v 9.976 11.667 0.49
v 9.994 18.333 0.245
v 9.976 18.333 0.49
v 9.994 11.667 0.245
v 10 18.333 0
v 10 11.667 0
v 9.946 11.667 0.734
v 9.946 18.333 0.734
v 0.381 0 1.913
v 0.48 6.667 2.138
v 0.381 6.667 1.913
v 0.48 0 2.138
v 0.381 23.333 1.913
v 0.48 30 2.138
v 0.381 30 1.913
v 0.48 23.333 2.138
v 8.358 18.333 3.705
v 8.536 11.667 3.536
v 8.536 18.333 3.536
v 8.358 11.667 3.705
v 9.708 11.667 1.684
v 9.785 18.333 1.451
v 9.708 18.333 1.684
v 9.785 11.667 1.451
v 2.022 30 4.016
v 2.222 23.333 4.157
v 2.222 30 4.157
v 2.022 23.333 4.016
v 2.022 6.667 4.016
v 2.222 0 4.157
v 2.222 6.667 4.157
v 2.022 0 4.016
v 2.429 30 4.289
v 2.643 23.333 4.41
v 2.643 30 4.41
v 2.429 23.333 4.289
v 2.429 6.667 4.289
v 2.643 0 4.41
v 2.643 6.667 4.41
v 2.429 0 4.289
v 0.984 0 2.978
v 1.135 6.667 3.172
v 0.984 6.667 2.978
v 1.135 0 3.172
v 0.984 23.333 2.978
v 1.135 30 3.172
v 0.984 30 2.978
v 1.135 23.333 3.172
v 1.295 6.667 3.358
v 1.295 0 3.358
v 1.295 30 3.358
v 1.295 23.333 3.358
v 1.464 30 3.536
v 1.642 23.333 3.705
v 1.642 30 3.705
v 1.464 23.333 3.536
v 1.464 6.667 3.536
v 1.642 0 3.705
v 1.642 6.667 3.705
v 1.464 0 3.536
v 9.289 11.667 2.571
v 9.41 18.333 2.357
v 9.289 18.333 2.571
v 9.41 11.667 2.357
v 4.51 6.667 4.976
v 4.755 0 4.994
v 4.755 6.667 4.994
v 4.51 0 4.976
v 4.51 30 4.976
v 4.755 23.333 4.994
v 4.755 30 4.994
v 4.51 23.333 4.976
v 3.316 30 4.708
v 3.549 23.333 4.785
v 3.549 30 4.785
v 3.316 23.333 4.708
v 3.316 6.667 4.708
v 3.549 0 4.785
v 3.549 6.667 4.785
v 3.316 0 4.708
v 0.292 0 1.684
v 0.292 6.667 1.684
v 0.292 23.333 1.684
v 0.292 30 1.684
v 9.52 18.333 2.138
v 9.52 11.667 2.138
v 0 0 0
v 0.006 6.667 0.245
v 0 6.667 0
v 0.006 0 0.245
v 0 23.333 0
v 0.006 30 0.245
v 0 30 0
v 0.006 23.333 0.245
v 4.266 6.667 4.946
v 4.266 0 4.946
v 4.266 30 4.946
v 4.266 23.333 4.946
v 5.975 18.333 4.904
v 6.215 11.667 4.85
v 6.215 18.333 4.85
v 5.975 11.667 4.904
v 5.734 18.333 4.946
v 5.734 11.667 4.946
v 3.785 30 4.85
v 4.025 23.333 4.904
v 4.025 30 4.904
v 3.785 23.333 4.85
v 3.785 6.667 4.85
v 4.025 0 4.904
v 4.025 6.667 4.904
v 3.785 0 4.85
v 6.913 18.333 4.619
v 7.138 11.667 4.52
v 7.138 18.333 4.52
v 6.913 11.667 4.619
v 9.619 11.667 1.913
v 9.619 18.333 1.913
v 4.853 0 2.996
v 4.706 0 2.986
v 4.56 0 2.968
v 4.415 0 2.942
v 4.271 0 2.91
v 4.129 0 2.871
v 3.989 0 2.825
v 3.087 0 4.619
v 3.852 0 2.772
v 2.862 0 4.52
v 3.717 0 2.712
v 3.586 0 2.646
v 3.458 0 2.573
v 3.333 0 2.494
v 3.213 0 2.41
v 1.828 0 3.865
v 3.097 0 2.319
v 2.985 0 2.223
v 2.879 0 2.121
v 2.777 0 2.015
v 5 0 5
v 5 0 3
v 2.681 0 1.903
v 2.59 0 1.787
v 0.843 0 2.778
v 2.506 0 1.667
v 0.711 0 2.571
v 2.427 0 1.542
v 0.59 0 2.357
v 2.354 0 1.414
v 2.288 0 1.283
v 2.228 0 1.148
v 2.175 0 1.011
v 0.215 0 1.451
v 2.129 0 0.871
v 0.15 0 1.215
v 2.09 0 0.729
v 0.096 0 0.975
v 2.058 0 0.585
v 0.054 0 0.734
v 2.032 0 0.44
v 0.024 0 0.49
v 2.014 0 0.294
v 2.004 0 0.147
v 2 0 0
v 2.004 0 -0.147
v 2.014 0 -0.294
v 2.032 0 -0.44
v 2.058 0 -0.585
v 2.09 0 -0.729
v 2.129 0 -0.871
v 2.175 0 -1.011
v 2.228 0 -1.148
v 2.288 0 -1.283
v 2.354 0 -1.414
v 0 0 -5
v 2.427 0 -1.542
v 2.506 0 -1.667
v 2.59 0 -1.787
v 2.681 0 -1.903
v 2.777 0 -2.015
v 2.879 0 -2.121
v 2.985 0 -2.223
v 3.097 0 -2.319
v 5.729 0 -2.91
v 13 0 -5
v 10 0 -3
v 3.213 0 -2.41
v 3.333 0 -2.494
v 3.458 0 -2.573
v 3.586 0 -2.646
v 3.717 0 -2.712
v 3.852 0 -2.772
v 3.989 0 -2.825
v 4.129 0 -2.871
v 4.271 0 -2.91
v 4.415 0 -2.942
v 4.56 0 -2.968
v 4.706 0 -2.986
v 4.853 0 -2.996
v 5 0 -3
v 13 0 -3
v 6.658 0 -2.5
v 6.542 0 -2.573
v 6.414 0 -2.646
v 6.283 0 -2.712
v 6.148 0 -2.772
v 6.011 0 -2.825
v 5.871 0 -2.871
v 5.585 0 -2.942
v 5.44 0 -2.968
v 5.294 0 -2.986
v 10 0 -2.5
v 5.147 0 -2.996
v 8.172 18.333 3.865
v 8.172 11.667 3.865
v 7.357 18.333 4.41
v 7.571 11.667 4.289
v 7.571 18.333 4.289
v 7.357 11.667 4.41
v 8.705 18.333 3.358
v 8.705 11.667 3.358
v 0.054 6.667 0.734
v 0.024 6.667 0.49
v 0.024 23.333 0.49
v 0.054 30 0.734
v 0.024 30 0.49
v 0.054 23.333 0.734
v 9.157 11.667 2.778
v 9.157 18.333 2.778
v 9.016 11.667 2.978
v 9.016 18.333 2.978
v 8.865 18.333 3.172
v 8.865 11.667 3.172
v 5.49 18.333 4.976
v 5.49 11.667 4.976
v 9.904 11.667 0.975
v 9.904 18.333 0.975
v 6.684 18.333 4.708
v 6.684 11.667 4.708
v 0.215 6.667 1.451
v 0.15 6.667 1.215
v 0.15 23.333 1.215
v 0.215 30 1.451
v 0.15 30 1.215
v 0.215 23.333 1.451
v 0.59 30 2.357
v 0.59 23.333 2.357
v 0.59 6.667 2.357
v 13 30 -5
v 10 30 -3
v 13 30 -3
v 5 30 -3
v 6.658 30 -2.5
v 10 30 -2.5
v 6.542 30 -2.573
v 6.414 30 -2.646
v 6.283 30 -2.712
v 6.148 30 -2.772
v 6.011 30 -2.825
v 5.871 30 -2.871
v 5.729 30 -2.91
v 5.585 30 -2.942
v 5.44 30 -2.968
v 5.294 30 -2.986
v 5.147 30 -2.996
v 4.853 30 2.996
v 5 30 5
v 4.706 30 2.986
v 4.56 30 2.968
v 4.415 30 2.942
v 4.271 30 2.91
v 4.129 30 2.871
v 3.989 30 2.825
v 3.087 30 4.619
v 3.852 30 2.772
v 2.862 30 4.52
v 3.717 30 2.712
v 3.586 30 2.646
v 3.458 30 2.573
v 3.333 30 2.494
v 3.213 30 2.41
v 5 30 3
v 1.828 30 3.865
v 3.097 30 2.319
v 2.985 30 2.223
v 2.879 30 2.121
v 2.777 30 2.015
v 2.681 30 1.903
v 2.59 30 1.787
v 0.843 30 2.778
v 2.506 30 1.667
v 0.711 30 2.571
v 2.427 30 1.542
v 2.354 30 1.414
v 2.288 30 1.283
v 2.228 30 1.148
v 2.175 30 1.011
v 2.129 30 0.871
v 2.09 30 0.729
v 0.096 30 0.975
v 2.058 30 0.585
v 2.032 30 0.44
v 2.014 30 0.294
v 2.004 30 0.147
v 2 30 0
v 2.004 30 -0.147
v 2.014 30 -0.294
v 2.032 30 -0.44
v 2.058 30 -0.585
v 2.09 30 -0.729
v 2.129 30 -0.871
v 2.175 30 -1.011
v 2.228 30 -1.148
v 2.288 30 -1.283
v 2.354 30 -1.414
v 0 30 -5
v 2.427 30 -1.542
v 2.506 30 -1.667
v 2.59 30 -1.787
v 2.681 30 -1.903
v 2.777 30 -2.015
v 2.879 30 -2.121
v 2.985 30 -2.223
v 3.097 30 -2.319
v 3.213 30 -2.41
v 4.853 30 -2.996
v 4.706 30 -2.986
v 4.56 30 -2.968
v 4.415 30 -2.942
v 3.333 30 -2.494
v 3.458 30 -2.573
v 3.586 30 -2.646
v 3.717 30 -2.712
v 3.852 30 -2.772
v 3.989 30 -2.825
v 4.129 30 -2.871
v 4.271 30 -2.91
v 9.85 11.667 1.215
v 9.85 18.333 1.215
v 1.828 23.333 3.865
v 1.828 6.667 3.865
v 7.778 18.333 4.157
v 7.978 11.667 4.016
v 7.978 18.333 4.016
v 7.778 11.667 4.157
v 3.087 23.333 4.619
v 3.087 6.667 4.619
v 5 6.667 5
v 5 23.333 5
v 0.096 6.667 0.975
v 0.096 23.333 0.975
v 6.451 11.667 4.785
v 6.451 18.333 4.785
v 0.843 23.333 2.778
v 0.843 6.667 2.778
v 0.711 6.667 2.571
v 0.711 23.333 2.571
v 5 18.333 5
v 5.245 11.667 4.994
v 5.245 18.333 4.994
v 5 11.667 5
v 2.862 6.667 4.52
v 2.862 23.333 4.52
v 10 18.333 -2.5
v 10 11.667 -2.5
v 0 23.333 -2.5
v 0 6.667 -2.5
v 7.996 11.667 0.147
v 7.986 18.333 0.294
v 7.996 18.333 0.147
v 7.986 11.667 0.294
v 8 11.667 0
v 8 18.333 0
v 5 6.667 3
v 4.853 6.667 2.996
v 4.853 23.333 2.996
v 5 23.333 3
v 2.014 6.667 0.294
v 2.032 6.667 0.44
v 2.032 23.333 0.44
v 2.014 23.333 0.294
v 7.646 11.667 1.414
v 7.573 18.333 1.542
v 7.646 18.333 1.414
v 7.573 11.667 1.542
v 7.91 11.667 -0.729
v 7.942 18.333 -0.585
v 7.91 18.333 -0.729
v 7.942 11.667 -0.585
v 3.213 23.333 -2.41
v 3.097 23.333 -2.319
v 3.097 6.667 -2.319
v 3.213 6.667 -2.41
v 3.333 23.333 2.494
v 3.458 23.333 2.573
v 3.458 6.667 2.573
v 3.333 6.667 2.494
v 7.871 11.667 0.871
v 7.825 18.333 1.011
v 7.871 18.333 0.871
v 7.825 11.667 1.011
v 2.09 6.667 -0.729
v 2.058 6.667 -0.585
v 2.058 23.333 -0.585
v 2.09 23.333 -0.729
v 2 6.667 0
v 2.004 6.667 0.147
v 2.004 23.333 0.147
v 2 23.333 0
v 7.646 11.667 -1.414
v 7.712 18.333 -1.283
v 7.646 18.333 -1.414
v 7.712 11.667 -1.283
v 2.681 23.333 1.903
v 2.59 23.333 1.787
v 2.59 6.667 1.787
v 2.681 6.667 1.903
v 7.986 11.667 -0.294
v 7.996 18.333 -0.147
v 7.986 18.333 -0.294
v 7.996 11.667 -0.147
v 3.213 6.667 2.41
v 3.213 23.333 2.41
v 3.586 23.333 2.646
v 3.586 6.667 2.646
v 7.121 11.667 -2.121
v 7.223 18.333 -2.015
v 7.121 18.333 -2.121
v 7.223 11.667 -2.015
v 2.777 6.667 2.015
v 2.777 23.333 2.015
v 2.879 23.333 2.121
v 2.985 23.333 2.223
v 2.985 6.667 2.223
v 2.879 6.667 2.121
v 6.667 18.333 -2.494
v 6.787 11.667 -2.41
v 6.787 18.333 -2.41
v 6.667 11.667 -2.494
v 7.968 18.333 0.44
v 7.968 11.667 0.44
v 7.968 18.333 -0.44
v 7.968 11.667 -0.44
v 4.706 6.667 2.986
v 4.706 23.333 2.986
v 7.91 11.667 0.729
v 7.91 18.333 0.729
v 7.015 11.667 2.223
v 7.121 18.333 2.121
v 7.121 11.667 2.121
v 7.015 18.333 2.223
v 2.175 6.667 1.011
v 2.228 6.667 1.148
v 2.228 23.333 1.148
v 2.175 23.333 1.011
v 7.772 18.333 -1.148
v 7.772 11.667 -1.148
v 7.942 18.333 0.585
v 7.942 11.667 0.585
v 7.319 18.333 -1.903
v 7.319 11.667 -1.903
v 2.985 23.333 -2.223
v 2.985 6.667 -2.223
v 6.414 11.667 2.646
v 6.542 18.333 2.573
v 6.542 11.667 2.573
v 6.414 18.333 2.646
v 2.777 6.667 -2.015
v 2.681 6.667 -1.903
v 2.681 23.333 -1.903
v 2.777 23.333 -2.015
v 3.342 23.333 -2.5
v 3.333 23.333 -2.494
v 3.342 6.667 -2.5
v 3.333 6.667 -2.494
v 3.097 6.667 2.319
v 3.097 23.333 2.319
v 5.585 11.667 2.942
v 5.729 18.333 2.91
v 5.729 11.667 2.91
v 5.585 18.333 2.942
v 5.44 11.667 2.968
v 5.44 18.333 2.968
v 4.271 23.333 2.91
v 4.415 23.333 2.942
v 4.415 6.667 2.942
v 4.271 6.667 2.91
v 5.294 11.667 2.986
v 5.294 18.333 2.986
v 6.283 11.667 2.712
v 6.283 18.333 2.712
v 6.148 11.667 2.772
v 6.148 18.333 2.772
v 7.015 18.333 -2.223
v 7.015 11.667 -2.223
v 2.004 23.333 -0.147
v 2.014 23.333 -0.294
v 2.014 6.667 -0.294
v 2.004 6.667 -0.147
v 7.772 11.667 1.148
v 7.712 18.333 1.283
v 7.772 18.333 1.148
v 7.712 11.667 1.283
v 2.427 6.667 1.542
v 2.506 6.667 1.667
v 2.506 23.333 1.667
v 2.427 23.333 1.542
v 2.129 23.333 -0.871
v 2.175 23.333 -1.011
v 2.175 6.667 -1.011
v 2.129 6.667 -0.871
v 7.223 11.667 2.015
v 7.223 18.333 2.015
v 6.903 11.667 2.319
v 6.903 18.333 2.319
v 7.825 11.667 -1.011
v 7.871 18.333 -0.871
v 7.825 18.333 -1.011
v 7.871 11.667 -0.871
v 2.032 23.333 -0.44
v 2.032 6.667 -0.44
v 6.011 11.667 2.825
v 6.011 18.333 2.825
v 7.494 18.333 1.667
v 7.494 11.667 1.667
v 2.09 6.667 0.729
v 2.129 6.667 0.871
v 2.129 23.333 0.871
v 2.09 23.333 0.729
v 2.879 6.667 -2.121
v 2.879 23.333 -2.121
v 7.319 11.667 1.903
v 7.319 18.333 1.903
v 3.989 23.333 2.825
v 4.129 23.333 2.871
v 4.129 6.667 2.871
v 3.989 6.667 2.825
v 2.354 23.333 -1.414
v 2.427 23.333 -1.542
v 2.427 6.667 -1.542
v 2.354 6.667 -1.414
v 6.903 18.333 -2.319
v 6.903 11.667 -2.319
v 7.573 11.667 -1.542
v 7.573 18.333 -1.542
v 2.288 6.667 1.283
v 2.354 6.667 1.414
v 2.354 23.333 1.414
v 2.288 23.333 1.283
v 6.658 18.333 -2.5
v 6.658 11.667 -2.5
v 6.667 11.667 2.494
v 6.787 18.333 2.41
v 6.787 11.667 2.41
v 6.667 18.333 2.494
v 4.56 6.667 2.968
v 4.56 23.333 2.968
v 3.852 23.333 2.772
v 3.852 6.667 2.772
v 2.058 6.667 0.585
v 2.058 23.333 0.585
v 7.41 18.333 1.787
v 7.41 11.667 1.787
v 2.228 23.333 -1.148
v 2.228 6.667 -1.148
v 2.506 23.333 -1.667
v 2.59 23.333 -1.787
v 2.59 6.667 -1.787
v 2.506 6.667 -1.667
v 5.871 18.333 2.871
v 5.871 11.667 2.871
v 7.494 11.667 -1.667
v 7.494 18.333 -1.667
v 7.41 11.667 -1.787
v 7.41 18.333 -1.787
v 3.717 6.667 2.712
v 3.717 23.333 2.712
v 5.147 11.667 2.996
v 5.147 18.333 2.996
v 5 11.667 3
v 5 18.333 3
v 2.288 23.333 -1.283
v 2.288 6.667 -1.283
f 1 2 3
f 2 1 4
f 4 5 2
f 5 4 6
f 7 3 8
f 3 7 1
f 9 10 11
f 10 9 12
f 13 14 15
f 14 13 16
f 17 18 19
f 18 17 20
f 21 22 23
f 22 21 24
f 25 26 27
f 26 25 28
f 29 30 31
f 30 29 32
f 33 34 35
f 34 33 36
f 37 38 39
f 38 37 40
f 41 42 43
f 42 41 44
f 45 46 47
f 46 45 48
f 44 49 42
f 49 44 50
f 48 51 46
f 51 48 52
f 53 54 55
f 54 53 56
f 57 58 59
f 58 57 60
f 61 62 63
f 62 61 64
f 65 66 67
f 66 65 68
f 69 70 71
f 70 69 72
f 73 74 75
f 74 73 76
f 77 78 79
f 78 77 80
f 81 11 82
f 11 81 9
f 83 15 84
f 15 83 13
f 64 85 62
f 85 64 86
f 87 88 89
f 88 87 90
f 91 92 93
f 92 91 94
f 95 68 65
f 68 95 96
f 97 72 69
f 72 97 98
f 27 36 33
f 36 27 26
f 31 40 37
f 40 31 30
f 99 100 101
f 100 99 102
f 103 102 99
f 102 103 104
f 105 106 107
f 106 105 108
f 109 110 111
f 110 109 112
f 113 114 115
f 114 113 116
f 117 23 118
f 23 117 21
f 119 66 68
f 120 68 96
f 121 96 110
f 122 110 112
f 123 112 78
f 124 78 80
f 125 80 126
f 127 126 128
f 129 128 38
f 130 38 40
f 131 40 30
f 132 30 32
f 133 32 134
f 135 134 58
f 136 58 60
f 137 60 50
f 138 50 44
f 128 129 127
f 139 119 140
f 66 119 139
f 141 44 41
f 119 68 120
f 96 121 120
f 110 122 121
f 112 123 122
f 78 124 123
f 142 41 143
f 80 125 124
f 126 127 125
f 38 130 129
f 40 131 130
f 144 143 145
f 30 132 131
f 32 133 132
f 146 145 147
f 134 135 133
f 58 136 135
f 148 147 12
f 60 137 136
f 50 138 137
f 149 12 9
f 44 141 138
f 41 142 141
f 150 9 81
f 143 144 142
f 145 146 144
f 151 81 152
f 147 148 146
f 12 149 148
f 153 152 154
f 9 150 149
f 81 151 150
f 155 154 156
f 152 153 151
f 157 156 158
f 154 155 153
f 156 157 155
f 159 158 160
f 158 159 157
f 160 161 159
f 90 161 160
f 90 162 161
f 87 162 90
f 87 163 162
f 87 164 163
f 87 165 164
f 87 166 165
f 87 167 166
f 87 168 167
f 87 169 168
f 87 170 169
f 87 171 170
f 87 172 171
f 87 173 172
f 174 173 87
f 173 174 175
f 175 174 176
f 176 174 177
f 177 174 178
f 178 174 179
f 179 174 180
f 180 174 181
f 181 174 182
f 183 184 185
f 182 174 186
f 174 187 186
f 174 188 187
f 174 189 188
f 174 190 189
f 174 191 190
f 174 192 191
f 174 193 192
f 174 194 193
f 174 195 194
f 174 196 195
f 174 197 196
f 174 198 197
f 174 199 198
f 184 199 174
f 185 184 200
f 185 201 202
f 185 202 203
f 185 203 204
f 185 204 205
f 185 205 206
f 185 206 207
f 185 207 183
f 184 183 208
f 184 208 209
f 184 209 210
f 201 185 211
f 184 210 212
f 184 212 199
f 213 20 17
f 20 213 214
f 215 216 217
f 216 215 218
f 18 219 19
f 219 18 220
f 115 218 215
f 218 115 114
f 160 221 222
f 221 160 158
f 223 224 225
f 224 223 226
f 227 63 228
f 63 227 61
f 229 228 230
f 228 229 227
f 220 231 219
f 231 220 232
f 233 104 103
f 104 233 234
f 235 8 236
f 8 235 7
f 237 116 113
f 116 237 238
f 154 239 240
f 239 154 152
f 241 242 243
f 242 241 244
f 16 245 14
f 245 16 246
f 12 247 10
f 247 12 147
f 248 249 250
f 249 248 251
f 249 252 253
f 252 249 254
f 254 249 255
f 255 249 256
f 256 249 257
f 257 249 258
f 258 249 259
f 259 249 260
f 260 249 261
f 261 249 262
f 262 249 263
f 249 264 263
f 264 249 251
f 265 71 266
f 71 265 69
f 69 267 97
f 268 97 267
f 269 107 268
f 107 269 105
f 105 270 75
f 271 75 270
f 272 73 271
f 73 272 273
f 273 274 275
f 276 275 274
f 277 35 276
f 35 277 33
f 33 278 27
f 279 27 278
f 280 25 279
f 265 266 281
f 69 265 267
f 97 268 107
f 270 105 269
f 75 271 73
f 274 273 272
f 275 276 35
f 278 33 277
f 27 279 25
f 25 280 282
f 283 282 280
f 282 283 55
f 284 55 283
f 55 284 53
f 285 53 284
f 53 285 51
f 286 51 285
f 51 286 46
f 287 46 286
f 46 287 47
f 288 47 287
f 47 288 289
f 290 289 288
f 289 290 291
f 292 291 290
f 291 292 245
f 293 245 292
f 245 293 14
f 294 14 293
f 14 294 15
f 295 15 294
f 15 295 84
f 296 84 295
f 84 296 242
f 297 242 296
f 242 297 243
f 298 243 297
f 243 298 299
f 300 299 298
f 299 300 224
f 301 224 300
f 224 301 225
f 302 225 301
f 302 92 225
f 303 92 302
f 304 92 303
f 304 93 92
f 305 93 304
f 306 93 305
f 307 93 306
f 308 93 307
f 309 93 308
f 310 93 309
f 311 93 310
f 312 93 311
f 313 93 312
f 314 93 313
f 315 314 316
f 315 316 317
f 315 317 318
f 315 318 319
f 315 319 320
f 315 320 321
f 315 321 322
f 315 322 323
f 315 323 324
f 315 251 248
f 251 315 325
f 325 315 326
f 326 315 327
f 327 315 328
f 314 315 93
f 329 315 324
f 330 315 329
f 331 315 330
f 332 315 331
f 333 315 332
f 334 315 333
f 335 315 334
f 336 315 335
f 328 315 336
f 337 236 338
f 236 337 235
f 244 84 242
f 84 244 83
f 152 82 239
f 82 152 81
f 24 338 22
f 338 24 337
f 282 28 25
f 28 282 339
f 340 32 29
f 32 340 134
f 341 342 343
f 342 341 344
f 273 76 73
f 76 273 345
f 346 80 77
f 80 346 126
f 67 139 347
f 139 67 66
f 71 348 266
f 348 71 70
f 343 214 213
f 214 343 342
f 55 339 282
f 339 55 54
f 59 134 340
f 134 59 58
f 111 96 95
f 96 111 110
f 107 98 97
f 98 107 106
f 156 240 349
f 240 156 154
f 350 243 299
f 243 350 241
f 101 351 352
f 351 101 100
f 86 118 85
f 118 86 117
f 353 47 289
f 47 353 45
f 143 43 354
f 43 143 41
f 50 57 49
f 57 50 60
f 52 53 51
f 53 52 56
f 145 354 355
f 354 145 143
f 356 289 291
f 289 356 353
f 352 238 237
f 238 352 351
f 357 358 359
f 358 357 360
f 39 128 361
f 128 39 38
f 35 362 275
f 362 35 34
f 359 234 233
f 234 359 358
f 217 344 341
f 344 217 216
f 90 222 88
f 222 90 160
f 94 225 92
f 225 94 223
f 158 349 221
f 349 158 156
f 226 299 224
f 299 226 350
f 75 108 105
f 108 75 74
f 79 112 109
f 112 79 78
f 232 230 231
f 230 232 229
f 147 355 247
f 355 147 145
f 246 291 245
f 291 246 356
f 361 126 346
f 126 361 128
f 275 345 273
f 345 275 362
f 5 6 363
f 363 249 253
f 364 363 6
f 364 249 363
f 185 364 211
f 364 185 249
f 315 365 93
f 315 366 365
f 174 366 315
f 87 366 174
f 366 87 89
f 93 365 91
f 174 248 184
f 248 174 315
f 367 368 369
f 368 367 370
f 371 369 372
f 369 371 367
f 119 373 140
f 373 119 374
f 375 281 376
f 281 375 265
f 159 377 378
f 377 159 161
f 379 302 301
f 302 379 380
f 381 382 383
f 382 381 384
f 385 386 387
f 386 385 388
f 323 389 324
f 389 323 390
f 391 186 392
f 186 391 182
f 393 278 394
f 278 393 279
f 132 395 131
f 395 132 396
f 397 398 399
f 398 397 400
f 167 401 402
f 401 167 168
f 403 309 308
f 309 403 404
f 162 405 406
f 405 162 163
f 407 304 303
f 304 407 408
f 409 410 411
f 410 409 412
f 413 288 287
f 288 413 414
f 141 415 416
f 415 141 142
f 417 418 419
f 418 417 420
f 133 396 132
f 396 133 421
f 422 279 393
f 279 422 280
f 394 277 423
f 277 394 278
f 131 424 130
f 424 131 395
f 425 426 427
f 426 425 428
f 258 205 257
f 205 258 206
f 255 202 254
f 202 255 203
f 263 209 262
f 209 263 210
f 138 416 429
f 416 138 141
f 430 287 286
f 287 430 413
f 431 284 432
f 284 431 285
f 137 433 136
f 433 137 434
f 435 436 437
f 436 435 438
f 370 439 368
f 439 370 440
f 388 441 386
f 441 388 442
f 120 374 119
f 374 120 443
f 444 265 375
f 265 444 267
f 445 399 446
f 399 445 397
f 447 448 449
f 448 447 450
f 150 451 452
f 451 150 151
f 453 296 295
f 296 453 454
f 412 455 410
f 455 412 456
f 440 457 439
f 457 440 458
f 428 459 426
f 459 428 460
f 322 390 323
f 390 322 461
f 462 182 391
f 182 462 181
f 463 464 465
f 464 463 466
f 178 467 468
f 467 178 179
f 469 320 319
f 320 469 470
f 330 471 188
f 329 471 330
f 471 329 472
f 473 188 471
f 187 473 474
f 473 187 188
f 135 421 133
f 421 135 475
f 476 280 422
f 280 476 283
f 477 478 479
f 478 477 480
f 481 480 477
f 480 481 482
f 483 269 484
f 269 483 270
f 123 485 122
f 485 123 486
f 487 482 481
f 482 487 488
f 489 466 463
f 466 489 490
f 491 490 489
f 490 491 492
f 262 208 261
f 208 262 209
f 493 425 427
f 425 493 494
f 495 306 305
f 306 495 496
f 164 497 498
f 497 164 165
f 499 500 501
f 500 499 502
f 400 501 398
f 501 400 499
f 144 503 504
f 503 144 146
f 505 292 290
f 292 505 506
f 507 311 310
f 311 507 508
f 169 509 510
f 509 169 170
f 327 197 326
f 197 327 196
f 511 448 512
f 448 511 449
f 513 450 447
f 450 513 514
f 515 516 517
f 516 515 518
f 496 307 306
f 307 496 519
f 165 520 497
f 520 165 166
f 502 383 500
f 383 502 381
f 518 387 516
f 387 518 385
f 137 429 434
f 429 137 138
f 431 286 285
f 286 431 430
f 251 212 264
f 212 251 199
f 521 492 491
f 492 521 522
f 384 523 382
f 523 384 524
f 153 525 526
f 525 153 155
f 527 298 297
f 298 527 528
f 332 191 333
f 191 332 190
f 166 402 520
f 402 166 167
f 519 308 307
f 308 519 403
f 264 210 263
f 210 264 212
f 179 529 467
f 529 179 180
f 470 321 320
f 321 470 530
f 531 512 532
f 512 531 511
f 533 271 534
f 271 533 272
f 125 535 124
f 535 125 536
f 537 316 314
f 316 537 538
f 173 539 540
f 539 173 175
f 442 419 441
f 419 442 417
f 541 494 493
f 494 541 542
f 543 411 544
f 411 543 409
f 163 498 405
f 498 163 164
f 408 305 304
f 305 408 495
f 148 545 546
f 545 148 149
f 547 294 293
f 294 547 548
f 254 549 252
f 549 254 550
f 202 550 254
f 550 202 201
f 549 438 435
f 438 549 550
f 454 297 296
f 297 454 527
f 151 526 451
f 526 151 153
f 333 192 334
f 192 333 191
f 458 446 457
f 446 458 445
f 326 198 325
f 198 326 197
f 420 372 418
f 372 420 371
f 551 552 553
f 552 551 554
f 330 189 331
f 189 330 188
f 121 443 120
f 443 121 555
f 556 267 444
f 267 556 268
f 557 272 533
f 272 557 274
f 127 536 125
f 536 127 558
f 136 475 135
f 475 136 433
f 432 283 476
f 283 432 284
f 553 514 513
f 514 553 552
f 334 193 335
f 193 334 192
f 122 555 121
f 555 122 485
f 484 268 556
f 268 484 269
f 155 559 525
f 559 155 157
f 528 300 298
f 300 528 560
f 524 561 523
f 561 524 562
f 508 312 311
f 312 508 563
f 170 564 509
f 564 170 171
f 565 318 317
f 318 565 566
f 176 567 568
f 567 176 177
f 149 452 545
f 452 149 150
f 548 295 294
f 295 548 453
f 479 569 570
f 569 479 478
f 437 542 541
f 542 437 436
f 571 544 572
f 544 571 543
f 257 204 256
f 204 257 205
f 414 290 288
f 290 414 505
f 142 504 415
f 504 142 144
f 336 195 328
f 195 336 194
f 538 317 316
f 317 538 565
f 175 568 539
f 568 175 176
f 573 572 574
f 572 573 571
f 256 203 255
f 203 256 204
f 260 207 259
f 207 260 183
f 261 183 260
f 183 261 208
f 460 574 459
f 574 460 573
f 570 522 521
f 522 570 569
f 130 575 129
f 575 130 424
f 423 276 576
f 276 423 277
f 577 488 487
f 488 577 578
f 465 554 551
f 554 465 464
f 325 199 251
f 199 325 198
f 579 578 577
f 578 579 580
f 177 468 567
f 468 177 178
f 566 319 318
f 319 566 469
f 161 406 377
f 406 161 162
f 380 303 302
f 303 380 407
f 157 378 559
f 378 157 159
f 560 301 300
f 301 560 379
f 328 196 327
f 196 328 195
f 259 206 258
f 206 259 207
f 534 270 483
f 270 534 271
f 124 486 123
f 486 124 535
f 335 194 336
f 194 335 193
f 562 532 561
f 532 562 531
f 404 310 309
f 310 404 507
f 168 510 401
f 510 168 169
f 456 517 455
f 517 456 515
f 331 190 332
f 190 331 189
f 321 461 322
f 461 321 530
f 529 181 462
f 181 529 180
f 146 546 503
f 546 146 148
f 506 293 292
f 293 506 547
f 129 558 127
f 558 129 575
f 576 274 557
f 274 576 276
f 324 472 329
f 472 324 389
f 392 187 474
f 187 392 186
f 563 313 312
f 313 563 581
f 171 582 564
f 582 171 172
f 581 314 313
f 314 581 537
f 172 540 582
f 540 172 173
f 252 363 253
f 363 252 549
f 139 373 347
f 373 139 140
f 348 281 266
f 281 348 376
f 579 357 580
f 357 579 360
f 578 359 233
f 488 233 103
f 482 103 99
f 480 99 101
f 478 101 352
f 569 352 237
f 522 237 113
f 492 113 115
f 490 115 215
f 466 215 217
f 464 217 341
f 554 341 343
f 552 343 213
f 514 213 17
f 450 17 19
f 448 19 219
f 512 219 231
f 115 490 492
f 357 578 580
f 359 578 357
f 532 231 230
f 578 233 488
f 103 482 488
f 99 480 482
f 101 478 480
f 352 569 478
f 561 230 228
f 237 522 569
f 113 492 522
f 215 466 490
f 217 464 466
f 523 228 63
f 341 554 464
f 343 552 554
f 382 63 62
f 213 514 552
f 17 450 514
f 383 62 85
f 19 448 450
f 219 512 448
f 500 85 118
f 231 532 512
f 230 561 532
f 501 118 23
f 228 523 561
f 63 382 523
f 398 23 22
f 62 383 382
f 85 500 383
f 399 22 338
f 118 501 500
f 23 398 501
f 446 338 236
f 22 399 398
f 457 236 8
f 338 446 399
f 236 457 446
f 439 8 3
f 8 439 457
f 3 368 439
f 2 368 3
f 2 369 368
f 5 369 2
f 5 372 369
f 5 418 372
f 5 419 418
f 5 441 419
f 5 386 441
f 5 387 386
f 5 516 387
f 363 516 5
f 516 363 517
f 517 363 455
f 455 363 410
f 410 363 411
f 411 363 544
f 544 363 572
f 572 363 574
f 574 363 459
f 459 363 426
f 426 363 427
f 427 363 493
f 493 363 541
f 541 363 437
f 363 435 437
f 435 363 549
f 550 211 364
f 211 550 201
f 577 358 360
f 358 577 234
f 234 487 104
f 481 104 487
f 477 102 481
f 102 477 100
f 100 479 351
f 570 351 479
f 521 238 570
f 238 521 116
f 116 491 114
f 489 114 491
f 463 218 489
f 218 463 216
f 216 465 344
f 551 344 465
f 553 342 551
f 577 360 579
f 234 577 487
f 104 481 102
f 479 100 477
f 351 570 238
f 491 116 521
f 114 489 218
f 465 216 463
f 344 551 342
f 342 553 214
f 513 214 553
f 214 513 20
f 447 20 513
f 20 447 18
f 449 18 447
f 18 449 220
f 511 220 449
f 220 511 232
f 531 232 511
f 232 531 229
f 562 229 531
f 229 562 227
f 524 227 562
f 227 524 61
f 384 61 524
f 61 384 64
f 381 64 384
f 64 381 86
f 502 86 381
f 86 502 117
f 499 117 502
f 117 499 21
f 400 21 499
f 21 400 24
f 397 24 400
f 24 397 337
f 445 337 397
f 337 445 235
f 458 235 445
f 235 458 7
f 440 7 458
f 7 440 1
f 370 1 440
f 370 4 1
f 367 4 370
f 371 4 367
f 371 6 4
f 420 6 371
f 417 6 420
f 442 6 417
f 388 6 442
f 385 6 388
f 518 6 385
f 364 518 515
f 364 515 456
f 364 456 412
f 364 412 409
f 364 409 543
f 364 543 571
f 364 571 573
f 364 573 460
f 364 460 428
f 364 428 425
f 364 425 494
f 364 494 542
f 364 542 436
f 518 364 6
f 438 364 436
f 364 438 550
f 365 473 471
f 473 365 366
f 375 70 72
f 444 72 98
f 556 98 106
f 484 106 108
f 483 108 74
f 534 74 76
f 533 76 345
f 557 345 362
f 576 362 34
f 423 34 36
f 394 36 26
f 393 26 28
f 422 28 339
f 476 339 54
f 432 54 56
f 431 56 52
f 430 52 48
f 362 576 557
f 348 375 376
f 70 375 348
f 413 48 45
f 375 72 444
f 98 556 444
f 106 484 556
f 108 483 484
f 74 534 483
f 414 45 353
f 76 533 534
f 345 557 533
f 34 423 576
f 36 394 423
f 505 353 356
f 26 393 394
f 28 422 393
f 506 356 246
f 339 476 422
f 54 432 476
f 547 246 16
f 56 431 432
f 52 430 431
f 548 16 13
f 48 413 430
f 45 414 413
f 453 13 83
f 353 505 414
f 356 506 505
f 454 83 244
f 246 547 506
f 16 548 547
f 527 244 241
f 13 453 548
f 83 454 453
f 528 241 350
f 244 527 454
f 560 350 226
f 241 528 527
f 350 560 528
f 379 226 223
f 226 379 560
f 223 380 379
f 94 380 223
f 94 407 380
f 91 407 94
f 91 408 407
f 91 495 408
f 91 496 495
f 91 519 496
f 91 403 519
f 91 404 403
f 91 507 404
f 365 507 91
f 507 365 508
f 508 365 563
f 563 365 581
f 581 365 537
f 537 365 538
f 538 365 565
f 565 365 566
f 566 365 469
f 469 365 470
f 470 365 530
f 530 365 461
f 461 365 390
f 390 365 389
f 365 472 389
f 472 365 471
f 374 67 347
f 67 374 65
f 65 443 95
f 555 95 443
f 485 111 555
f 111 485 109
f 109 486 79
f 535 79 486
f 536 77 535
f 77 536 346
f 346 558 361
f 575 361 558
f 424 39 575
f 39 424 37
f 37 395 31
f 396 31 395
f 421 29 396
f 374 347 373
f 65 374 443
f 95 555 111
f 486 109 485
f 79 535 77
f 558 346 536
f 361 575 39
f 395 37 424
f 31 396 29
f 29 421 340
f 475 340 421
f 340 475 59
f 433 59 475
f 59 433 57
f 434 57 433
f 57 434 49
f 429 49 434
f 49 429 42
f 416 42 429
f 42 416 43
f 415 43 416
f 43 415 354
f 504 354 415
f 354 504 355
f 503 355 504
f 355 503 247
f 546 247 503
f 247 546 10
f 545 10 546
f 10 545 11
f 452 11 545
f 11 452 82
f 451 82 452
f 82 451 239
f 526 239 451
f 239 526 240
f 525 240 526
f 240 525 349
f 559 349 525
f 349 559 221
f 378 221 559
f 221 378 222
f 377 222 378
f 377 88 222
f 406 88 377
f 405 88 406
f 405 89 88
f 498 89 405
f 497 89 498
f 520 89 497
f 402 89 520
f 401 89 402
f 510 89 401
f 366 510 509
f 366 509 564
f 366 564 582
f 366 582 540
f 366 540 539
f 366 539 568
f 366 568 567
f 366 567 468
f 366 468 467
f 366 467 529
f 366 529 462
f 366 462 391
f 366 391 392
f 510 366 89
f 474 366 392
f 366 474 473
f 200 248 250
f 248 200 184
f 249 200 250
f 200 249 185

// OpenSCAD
$fn = 128;
module clip(r = 10, width = 30, thickness = 2, gap = 5, extend_base = 0) {
  outer_r = r + thickness;
  mod_width = (width - (2 * gap)) / 3;

  translate([0, 0, -outer_r]) cube([outer_r * 2 + extend_base, width, thickness]);

  translate([outer_r, width, 0]) {
    difference() {
      rotate(90, [1, 0, 0]) {
        cylinder(h = width, r = outer_r);
        translate([-outer_r, -outer_r, 0]) {
          cube([outer_r * 2, outer_r, width]);
        }
      }
      rotate(90, [1, 0, 0]) {
        cylinder(h = width, r = r);
      }
      translate([0, -mod_width - gap, -0.5 * outer_r]) {
        cube([outer_r, mod_width + gap, 1.5 * outer_r]);
      }
      translate([0, -width, -0.5 * outer_r]) {
        cube([outer_r, mod_width + gap, 1.5 * outer_r]);
      }
      translate([-outer_r, ((-mod_width - gap) * 2), -0.5 * outer_r]) {
        cube([outer_r, mod_width + gap + gap, 1.5 * outer_r]);
      }
    }
  }
}
clip(r = 3, extend_base = 3);
